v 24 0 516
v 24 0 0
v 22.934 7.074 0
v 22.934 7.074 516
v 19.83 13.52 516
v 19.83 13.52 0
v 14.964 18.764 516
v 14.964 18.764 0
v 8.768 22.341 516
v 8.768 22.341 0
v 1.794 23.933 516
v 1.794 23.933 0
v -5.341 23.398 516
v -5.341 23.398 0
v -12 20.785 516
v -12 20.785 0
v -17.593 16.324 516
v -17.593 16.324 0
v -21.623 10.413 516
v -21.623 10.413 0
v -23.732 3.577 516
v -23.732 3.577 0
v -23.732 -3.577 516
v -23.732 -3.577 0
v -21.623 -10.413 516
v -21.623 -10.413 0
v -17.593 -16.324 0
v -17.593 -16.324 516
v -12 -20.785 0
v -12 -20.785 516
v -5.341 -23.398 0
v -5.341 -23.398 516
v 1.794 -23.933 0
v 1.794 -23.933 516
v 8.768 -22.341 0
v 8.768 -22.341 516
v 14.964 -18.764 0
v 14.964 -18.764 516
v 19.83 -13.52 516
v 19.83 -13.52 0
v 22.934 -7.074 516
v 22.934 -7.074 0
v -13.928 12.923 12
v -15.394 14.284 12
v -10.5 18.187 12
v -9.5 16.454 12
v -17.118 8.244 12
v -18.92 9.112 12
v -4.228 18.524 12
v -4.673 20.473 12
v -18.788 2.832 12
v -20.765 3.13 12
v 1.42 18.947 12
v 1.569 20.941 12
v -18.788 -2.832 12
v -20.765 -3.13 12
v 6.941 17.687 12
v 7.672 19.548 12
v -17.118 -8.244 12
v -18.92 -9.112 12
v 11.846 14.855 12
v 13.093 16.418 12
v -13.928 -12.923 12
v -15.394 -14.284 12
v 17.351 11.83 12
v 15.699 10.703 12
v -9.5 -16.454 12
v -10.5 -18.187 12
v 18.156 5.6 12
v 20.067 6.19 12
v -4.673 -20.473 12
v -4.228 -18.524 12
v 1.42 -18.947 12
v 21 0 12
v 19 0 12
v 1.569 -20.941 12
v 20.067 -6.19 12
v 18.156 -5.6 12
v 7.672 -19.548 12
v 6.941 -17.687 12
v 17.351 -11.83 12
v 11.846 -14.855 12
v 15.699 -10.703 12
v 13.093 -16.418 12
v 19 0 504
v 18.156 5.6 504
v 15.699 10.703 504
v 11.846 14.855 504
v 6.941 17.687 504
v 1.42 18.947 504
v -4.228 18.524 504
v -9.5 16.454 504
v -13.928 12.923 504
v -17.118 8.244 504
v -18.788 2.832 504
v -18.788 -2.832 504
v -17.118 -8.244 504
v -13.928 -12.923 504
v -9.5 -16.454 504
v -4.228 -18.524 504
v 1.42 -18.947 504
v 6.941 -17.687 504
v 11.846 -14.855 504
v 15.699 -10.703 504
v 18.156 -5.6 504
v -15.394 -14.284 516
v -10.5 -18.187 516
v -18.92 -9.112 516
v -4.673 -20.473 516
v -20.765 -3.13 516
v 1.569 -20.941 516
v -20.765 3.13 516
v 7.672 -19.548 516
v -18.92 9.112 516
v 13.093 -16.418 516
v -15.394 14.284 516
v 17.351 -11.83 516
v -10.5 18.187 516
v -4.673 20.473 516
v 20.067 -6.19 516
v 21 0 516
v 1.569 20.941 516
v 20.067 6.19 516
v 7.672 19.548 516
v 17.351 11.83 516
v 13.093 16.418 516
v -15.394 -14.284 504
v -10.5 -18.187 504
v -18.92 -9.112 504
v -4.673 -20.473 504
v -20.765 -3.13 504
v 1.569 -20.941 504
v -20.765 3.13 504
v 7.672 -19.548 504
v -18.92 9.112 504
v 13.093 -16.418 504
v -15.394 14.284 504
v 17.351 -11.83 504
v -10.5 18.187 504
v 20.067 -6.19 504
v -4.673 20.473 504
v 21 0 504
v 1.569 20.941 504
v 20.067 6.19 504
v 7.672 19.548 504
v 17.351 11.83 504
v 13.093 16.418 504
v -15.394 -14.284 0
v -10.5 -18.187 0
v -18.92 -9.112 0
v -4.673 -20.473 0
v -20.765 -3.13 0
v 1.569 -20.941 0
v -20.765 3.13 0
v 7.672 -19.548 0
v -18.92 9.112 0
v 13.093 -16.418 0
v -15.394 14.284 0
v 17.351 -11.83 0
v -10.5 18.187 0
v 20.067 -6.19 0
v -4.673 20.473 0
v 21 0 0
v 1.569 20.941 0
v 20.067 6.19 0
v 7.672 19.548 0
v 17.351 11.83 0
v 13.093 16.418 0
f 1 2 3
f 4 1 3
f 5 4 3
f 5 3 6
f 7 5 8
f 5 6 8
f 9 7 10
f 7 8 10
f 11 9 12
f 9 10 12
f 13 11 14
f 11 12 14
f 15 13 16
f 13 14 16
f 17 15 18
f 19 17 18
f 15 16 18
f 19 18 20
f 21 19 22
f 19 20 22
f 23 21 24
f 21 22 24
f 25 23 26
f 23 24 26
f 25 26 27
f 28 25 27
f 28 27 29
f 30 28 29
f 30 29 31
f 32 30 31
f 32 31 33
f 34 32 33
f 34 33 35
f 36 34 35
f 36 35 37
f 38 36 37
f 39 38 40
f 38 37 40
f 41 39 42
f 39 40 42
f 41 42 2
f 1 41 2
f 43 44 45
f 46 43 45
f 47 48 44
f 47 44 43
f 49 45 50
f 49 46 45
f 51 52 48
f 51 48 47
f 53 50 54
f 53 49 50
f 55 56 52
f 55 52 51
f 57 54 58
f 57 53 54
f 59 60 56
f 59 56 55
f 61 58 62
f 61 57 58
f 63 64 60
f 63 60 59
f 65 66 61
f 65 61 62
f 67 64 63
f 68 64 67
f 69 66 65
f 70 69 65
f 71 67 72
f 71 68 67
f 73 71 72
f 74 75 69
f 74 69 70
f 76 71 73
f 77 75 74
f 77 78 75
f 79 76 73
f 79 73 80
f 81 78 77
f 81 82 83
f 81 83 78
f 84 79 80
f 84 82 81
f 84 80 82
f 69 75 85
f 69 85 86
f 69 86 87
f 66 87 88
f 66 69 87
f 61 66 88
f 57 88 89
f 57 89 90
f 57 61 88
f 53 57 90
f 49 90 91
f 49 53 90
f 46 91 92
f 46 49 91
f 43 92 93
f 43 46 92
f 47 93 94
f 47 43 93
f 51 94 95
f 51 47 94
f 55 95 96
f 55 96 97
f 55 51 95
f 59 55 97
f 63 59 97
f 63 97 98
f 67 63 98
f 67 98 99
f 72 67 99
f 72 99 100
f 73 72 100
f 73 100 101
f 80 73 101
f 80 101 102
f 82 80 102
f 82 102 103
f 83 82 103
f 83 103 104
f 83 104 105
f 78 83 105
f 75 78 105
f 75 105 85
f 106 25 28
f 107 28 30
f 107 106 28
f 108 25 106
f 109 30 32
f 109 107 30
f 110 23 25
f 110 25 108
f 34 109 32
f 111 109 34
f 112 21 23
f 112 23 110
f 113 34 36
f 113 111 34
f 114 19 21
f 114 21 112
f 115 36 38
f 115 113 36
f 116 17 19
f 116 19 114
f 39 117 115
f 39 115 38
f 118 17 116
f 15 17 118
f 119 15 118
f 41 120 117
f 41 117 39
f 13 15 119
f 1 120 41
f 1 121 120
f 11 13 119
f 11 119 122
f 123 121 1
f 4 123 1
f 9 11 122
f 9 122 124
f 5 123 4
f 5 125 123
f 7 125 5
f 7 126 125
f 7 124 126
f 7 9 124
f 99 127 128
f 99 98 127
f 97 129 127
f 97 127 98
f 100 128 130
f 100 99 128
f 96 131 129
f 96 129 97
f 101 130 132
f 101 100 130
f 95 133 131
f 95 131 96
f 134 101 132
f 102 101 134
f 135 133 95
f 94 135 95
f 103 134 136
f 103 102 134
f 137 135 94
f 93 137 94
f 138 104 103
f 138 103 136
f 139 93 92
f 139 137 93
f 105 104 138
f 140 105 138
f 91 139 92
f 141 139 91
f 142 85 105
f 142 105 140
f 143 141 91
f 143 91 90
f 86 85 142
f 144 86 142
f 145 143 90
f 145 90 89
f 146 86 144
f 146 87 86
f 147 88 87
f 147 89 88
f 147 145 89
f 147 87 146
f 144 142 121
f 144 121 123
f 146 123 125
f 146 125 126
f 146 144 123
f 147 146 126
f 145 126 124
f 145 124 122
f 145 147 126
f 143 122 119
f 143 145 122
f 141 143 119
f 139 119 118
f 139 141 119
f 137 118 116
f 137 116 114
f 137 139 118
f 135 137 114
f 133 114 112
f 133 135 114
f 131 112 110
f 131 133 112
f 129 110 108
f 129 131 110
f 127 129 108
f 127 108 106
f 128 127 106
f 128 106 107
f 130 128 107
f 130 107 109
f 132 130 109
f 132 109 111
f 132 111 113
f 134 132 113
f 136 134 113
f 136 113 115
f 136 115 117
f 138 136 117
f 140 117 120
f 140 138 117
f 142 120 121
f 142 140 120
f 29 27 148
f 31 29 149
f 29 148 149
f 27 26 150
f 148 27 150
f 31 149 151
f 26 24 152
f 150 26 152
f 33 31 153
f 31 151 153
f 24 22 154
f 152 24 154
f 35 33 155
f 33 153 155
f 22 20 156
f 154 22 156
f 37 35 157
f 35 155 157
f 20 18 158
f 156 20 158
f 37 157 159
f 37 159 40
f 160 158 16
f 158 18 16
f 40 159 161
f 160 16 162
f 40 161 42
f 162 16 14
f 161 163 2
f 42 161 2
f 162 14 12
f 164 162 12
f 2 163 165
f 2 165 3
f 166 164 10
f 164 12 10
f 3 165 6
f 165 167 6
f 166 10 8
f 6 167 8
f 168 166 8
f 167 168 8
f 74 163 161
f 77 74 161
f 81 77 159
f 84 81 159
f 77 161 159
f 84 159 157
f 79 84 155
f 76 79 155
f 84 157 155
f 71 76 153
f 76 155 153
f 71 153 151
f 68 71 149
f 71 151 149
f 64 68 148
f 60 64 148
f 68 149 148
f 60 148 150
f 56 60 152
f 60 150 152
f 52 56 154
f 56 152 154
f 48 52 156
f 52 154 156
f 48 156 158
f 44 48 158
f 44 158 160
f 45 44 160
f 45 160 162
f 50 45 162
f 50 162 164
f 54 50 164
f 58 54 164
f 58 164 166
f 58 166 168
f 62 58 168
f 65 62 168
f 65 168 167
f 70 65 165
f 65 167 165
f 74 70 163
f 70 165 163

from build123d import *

# Parameters (mm, degrees)
IZIM1_R                     = 24
IZIM1_R_2                   = 19
Y_KSEKLIK_EKSTR_ZYON1_DEPTH = 516
KES_EKSTR_ZYON1_START       = -12
IZIM2_R                     = 21
IZIM2_R_2                   = 19
KES_EKSTR_ZYON1_DEPTH       = 12
IZIM3_R                     = 21
IZIM3_R_2                   = 19
KES_EKSTR_ZYON2_DEPTH       = 12


with BuildPart() as part:
    # Çizim1 → Yükseklik-Ekstrüzyon1 (new body)
    with BuildSketch(Plane.XY):
        Circle(IZIM1_R)
        Circle(IZIM1_R_2, mode=Mode.SUBTRACT)
    extrude(amount=Y_KSEKLIK_EKSTR_ZYON1_DEPTH)

    # Çizim2 → Kes-Ekstrüzyon1 (cut)
    with BuildSketch(Plane.XY.offset(516).offset(KES_EKSTR_ZYON1_START)):
        Circle(IZIM2_R)
        Circle(IZIM2_R_2, mode=Mode.SUBTRACT)
    extrude(amount=KES_EKSTR_ZYON1_DEPTH, mode=Mode.SUBTRACT)

    # Çizim3 → Kes-Ekstrüzyon2 (cut)
    with BuildSketch(Plane(origin=(0, 0, 0), x_dir=(-1, 0, 0), z_dir=(0, 0, -1))):
        with Locations(Location((0, 0, 0), (0, 0, 180))):
            Circle(IZIM3_R)
        Circle(IZIM3_R_2, mode=Mode.SUBTRACT)
    extrude(amount=-KES_EKSTR_ZYON2_DEPTH, mode=Mode.SUBTRACT)


solid = part.part
